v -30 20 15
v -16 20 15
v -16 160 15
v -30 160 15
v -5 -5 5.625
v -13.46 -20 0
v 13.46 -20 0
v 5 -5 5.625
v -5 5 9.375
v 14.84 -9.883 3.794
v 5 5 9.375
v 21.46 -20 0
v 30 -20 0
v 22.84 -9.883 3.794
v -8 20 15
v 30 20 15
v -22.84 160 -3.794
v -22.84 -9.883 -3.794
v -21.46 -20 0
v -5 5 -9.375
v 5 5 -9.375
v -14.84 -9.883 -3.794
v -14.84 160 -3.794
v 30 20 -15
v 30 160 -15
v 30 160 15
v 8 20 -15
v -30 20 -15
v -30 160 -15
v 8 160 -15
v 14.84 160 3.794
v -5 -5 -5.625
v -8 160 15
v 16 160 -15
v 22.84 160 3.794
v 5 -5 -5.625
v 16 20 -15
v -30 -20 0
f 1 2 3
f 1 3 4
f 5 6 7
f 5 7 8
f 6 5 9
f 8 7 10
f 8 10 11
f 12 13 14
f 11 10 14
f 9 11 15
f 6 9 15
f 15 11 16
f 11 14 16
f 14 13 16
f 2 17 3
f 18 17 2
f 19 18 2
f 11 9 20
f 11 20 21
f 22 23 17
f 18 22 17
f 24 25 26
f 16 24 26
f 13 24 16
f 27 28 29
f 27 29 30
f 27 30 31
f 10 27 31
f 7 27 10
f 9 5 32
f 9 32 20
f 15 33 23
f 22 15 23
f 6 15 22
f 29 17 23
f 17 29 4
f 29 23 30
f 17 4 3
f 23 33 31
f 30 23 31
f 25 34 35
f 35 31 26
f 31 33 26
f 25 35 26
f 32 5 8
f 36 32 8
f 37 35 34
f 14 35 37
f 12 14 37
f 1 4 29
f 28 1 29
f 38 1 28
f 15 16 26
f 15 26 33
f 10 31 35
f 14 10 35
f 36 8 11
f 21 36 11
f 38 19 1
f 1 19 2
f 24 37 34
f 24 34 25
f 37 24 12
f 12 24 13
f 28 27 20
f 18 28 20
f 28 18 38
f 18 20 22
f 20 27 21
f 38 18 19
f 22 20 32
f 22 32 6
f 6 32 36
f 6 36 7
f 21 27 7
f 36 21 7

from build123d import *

# Parameters (mm, degrees)
F1_DEPTH = 160
F2_W     = 10
F2_H     = 10
F3_DEPTH = 60
F5_DEPTH = 60


with BuildPart() as f1:
    # F0 (on Front) → F1 (new body, symmetric)
    with BuildSketch(Plane.XZ):
        Polygon((30, -15), (30, 15), (-8, 15), (-14.8404028665, -3.7938524157), (-22.8404028665, -3.7938524157), (-16, 15), (-30, 15), (-30, -15), (8, -15), (14.8404028665, 3.7938524157), (22.8404028665, 3.7938524157), (16, -15), align=None)
    extrude(amount=F1_DEPTH, both=True)

    # F2 (on face) → F3 (cut)
    with BuildSketch(Plane.XY.offset(15)):
        Rectangle(F2_W, F2_H)
    extrude(amount=-F3_DEPTH, mode=Mode.SUBTRACT)

    # F4 (on face) → F5 (cut)
    with BuildSketch(Plane.YZ.offset(30)):
        Polygon((0, 7.5), (0, 15), (-160, 15), (-160, -15), (0, -15), (0, -7.5), (-20, 0), align=None)
        Polygon((20, 15), (0, 15), (0, 7.5), align=None)
        Polygon((0, -15), (20, -15), (0, -7.5), align=None)
    extrude(amount=-F5_DEPTH, mode=Mode.SUBTRACT)


solid = f1.part
